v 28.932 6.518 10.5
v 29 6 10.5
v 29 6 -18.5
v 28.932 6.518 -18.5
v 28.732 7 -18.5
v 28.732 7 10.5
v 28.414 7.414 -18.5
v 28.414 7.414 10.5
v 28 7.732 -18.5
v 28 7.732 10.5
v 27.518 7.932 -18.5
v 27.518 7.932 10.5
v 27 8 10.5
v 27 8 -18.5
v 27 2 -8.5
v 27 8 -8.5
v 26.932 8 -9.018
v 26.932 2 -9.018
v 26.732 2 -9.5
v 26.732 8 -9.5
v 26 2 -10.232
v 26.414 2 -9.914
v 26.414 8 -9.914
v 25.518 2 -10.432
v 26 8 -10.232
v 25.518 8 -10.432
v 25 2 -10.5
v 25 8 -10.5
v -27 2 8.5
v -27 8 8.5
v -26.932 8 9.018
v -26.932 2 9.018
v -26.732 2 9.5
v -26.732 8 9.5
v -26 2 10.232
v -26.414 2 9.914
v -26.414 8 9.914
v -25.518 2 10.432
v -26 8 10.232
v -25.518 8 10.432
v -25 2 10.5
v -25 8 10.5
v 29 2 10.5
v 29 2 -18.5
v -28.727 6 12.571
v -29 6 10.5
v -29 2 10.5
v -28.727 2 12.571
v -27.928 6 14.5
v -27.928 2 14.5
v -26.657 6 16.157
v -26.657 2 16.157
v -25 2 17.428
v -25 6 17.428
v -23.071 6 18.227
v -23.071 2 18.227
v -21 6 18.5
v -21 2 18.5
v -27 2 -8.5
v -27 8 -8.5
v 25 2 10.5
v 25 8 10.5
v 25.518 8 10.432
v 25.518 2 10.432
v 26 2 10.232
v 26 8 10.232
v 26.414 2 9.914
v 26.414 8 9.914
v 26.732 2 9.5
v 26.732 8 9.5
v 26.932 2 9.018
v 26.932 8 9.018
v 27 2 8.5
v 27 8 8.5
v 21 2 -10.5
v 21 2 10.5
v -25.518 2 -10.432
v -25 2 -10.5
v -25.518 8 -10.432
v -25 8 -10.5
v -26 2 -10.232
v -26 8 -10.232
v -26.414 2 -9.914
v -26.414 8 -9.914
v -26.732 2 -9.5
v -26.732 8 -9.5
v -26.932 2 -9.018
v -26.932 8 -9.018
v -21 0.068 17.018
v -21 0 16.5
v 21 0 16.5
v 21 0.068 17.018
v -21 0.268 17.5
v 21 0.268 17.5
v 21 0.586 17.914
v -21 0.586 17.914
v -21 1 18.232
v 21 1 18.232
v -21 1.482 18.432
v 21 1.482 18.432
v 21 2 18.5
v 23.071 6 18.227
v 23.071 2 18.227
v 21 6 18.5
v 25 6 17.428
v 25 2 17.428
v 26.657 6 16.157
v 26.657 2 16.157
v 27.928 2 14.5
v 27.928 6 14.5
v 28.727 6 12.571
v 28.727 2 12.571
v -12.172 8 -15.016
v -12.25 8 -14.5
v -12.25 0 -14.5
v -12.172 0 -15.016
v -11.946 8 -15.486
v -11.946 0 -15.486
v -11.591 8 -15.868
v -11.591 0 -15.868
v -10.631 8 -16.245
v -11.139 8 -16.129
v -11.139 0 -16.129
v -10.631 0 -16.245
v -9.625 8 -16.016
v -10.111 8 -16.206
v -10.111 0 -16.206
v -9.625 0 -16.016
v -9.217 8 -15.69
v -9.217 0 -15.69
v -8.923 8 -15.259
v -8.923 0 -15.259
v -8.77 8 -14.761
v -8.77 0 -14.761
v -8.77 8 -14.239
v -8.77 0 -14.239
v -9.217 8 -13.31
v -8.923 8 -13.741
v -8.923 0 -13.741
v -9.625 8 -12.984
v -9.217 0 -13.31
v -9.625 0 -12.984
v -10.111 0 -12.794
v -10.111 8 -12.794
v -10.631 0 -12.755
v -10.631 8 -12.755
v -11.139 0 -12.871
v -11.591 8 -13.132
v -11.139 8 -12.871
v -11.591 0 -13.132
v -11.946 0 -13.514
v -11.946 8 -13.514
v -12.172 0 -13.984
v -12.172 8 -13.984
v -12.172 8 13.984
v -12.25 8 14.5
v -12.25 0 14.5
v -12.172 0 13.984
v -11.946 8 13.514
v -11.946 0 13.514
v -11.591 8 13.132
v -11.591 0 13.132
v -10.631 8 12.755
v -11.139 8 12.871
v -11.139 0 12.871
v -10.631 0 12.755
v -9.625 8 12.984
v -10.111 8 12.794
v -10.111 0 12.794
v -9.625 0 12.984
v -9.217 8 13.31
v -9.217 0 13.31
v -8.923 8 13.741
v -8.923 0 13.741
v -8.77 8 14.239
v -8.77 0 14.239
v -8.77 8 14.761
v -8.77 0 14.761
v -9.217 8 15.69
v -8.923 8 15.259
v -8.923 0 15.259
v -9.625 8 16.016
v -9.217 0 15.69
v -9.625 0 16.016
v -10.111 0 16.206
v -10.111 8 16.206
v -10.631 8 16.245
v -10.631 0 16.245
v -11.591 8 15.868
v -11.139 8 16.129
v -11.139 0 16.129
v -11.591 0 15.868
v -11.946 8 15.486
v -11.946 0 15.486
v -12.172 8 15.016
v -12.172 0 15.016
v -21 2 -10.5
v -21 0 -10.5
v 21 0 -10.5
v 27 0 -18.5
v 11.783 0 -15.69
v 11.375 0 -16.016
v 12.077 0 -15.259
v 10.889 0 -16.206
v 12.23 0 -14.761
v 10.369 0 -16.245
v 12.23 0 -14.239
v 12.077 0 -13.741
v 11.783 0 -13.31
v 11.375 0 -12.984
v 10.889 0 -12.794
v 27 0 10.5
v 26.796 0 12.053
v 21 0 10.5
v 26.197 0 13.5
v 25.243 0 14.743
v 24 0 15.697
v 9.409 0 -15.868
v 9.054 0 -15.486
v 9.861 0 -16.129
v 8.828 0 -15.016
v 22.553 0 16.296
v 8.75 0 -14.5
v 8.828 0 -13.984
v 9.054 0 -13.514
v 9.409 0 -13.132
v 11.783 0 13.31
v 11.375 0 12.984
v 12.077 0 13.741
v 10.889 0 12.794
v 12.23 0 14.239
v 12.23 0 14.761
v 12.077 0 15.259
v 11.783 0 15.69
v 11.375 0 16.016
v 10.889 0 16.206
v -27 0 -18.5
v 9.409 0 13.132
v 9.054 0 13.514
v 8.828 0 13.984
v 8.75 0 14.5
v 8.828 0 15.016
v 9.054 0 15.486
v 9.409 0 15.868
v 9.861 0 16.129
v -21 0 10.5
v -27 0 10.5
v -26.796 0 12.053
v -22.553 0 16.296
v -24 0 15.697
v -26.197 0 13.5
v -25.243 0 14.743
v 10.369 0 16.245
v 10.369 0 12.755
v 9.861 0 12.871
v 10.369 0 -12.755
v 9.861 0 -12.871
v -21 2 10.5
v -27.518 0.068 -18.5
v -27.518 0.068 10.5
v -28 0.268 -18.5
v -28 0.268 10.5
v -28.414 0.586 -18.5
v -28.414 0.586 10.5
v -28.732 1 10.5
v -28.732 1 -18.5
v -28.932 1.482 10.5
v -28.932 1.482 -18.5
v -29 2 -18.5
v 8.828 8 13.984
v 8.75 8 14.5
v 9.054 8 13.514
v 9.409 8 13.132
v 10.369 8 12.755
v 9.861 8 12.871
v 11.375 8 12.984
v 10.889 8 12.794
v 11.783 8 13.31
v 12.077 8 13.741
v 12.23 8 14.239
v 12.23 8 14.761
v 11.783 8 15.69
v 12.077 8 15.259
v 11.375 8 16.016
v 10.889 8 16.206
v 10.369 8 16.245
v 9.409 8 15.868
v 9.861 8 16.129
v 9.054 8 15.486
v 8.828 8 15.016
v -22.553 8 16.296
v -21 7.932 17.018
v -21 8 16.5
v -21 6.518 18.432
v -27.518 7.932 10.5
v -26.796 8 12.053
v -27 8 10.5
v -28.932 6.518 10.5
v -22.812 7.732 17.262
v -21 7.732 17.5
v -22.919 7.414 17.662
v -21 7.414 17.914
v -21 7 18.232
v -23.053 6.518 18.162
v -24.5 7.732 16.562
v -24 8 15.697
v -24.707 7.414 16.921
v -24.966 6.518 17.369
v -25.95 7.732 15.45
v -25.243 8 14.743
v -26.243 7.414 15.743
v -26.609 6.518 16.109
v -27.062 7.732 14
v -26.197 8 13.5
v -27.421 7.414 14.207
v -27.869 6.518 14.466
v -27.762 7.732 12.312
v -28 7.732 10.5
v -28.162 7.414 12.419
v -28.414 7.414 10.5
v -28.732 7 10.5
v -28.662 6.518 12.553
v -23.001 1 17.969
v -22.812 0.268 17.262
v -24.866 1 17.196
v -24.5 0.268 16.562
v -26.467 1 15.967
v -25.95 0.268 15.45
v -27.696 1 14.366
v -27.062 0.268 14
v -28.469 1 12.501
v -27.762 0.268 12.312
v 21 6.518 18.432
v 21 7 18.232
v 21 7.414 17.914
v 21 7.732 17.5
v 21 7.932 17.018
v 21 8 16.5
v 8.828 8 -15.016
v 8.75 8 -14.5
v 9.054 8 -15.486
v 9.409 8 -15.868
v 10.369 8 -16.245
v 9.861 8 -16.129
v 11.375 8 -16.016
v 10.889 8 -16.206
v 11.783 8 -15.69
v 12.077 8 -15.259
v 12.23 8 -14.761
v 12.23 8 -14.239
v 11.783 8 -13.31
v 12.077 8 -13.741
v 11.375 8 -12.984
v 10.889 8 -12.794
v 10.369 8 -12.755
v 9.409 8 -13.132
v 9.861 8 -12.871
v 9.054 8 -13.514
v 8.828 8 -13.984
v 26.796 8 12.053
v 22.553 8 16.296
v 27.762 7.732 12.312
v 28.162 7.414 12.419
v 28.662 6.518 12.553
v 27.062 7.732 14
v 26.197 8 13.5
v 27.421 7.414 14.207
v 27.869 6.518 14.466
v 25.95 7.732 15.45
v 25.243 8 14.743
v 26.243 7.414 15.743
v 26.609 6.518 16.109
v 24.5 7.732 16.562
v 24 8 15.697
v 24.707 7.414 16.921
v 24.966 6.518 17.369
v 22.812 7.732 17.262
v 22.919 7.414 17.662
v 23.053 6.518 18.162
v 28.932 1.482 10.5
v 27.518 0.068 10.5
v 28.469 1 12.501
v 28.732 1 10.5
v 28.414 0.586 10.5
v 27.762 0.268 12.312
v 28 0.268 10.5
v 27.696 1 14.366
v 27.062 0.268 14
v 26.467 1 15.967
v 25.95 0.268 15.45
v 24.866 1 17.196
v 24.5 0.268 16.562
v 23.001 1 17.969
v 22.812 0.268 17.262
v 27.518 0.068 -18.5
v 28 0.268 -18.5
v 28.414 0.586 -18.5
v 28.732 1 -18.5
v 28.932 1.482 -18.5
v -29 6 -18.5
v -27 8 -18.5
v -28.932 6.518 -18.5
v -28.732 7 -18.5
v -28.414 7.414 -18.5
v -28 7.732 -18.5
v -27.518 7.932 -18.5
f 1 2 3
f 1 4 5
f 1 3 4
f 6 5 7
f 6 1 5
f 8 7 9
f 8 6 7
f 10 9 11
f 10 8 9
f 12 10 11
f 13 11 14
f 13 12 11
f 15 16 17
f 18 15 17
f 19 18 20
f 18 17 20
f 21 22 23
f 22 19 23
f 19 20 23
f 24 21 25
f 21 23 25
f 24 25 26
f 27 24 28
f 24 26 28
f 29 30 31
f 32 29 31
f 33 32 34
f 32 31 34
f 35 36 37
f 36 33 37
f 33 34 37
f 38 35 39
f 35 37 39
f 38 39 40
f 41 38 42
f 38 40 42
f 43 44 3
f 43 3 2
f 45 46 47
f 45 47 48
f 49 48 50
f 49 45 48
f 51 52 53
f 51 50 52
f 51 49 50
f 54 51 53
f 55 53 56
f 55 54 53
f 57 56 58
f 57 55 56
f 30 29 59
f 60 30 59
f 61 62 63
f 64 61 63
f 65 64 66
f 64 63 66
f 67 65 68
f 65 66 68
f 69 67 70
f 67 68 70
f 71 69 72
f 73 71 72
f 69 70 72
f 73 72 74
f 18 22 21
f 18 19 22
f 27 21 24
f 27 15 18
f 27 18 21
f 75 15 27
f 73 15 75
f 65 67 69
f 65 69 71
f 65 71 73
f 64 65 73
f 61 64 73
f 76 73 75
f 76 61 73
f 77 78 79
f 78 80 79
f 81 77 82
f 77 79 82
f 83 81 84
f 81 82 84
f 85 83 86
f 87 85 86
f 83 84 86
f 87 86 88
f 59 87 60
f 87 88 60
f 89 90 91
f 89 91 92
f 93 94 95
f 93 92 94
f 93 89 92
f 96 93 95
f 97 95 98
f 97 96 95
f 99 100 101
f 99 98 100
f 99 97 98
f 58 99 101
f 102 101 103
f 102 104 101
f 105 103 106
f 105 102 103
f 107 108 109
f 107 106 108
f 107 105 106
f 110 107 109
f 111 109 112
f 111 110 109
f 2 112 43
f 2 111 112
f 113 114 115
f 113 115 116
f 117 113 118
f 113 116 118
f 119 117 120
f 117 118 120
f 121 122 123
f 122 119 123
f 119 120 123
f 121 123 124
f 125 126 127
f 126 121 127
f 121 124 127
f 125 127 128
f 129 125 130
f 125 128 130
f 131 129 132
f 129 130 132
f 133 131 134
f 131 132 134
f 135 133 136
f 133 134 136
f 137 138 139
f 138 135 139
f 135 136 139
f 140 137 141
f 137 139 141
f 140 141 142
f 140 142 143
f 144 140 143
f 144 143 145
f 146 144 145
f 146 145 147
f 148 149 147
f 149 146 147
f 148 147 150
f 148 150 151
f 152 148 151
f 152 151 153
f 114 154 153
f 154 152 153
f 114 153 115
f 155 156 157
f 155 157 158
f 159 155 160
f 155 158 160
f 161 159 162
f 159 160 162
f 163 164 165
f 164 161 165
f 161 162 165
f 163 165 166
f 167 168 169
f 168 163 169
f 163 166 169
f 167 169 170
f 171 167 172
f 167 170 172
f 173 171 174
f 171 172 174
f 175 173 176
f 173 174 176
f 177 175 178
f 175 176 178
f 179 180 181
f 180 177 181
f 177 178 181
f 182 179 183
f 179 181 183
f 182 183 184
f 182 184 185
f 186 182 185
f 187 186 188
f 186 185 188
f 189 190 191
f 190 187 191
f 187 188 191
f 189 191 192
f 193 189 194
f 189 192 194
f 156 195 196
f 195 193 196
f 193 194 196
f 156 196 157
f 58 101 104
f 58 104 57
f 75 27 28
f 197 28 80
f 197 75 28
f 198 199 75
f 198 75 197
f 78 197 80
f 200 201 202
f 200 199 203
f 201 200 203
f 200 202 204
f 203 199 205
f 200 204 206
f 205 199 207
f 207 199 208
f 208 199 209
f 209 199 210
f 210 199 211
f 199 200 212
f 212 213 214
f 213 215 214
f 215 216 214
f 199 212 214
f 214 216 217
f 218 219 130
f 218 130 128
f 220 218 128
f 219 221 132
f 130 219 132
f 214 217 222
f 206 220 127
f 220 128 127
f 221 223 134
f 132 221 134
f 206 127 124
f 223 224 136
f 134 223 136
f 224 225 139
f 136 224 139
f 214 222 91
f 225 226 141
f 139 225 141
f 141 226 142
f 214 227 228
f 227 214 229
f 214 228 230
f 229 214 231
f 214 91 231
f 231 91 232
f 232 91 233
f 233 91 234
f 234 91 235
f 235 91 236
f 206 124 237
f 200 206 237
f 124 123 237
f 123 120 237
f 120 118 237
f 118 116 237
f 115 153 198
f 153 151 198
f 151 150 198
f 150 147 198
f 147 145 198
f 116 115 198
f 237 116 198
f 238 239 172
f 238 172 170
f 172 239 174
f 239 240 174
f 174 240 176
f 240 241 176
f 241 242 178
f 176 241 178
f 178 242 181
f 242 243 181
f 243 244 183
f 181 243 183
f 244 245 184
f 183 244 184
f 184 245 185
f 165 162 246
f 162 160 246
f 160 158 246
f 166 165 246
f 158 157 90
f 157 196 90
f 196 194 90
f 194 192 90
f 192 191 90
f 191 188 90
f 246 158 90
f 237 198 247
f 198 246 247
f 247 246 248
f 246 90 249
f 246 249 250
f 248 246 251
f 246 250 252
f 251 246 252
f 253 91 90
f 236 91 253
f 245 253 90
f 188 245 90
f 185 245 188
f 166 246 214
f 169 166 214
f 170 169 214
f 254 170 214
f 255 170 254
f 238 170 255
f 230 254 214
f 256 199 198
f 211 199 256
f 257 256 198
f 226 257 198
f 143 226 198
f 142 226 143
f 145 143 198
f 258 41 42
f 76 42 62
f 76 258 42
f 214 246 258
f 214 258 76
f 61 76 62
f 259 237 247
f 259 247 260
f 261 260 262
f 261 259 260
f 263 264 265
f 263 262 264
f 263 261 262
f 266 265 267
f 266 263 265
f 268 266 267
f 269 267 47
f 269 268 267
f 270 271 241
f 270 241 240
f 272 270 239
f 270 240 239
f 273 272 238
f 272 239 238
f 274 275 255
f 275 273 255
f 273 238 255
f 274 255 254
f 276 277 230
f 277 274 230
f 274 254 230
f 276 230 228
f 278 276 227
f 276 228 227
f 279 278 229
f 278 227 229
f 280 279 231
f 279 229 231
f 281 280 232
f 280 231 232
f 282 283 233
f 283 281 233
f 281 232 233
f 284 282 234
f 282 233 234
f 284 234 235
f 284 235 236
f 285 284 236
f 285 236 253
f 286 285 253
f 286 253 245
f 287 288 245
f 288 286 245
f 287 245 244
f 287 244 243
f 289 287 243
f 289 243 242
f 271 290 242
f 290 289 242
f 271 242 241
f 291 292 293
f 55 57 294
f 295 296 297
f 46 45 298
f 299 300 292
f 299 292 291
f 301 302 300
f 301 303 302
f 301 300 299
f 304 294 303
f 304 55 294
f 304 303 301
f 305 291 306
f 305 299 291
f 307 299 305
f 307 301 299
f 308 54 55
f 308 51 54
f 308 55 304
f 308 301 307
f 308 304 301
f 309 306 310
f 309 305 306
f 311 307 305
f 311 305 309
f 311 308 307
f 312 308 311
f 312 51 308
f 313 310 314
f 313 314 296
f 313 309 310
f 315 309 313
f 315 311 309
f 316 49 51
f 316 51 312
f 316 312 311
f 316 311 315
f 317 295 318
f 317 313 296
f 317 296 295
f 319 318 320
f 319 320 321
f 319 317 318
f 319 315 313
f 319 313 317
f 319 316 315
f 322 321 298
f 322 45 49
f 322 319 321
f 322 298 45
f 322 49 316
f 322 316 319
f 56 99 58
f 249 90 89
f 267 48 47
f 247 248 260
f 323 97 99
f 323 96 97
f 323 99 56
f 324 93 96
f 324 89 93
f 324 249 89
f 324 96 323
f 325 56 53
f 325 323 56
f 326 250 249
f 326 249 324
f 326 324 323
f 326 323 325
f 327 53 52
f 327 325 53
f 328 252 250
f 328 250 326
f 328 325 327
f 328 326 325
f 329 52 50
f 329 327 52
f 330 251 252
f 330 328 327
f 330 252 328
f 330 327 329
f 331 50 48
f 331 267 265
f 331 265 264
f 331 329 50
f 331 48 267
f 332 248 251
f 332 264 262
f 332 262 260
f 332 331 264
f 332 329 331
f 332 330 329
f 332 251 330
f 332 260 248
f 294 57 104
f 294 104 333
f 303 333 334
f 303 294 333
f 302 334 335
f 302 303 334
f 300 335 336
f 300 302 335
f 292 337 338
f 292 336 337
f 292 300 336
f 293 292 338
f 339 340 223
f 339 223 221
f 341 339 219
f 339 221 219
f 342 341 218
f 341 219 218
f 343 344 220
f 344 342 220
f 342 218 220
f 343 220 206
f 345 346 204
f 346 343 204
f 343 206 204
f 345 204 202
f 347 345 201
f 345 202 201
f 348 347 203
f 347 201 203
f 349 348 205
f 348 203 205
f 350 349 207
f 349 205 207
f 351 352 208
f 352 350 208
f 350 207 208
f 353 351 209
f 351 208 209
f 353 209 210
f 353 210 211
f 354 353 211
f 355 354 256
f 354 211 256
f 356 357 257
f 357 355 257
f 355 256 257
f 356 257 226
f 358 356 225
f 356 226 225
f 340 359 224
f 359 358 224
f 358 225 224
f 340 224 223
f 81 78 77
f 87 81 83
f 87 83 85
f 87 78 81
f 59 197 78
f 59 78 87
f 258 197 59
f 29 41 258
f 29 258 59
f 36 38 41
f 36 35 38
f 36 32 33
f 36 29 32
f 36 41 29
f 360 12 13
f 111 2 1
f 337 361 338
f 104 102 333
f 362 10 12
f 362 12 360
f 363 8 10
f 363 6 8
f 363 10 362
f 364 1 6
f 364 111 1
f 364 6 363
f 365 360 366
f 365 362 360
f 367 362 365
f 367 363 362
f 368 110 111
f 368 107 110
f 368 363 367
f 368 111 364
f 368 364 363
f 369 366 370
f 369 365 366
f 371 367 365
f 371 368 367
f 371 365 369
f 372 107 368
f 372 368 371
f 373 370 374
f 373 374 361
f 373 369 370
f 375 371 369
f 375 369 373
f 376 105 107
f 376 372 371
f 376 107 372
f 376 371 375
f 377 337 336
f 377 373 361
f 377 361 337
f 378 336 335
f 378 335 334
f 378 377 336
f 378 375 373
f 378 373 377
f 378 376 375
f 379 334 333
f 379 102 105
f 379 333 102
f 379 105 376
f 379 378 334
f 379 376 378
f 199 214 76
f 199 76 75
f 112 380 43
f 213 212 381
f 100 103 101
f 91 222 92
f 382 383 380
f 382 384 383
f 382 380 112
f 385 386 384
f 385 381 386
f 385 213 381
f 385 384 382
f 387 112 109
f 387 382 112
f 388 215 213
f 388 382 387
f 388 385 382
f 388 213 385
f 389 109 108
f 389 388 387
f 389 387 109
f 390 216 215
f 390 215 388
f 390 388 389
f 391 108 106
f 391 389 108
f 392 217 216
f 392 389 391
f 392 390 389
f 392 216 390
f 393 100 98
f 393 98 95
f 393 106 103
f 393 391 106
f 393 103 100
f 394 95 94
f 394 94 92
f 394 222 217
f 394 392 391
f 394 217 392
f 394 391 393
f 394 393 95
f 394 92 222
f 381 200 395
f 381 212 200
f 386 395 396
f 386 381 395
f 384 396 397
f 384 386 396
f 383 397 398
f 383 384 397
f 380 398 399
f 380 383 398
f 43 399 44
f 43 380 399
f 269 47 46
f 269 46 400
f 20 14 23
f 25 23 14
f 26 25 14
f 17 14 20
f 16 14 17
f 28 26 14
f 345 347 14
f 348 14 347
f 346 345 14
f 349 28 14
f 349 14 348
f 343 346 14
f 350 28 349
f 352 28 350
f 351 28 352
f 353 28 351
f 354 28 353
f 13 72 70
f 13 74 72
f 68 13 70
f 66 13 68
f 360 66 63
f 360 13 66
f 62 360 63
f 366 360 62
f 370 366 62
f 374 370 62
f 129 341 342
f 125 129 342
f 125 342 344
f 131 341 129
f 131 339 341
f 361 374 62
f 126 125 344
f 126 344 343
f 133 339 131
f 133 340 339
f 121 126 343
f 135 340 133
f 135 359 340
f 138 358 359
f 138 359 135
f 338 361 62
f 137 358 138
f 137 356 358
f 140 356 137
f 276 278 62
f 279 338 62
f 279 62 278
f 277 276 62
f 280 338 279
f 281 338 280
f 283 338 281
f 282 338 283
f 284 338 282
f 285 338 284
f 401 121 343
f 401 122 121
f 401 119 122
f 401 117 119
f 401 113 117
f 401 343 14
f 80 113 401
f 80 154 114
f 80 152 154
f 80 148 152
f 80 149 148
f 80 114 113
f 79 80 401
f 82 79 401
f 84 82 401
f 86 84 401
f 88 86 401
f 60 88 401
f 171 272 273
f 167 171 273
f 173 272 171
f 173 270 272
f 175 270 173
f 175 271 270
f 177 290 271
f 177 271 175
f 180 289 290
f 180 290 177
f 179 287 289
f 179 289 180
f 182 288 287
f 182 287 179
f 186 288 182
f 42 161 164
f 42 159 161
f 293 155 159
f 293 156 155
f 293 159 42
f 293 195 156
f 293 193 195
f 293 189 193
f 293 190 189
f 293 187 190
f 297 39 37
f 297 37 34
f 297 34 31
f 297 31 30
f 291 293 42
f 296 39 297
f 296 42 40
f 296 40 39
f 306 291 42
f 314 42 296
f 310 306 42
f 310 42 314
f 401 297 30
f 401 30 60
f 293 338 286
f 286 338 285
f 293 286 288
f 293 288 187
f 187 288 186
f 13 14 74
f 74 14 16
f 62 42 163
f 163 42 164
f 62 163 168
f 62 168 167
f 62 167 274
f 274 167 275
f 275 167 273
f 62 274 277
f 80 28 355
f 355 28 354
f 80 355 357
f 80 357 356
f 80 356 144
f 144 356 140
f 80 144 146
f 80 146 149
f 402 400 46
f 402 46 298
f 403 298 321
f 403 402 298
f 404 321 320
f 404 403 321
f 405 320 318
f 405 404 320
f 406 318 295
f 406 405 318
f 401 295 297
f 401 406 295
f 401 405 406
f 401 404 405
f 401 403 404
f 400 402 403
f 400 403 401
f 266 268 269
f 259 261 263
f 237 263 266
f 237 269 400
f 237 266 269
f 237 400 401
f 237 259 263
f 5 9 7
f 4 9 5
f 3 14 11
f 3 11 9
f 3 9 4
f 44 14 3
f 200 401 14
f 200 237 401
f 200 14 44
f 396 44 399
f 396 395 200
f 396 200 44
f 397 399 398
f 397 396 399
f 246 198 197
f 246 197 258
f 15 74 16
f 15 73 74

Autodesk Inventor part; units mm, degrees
ref_plane "YZ Plane" through (0, 0, 0) normal (1, 0, 0) x (0, 1, 0)
ref_plane "XZ Plane" through (0, 0, 0) normal (0, 1, 0) x (-1, 0, 0)
ref_plane "XY Plane" through (0, 0, 0) normal (0, 0, 1) x (1, 0, 0)
sketch "Sketch1" plane through (0, 0, 0) normal (0, 1, 0) x (-1, 0, 0)
  line L0 (21, 10.5) -> (-21, 10.5)
  line L1 (-21, 10.5) -> (-21, -10.5)
  line L2 (-21, -10.5) -> (21, -10.5)
  line L3 (21, -10.5) -> (21, 10.5)
  line L4 (21, 10.5) -> (-21, -10.5) construction
  line L5 (-21, 10.5) -> (21, -10.5) construction
  line L6 (-29, 18.5) -> (29, 18.5)
  line L7 (29, 18.5) -> (29, -18.5)
  line L8 (29, -18.5) -> (-29, -18.5)
  line L9 (-29, -18.5) -> (-29, 18.5)
  circle A0 centre (10.5, 14.5) radius 1.75
  line L10 (0, 10.5) -> (0, -10.5) construction
  line L11 (-21, 0) -> (21, 0) construction
  circle A1 centre (10.5, -14.5) radius 1.75
  circle A2 centre (-10.5, 14.5) radius 1.75
  circle A3 centre (-10.5, -14.5) radius 1.75
  line L12 (-21, 10.5) -> (-27, 10.5)
  line L13 (-27, 10.5) -> (-27, -10.5)
  line L14 (-27, -10.5) -> (-21, -10.5)
  line L15 (-21, -10.5) -> (-21, 10.5)
  line L16 (21, 10.5) -> (27, 10.5)
  line L17 (27, 10.5) -> (27, -10.5)
  line L18 (27, -10.5) -> (21, -10.5)
  point P0 (0, 0)
  dimension "d0" = 21
  dimension "d1" = 42
  dimension "d2" = 8
  dimension "d3" = 3.5
  dimension "d4" = 10.5
  dimension "d5" = 4
  dimension "d6" = 6
  dimension "d7" = 21
extrude "Extrusion1" add sketch "Sketch1" along normal blind 8
extrude "Extrusion2" add sketch "Sketch1" along normal blind 2 contours L16 L17 L18 L3 | L1 L14 L13 L12
fillet "Fillet1" radius 8 2 edges at (-29, 4, 18.5) (29, 4, 18.5)
fillet "Fillet2" radius 2 4 edges at (-27, 5, 10.5) (-27, 5, -10.5) (27, 5, 10.5) (27, 5, -10.5)
fillet "Fillet3" radius 2 10 edges at (-26.6569, 0, 16.1569) (0, 0, 18.5) (26.6569, 0, 16.1569) (29, 0, -4) (-29, 0, -4) (-26.6569, 8, 16.1569) (0, 8, 18.5) (26.6569, 8, 16.1569) (29, 8, -4) (-29, 8, -4)
equation "\"d0\" = MountWidth"
equation "\"d1\" = MountLength"
equation "\"d2\" = MountThickness"
equation "\"d3\" = THROUGH_DIAMETER"
equation "\"d4\" = 0.25 * MountLength"
equation "\"d5\" = 0.5 * MountThickness"
equation "\"d7\" = MountWidth"
equation "\"d8\" = OUTER_HEIGHT"
equation "\"d12\" = OUTER_FILLET"
equation "\"d13\" = INNER_FILLET"
equation "\"d14\" = PART_FILLET"
equation "\"MountWidth\" = 21"
equation "\"MountLength\" = 42"
equation "\"MountThickness\" = 8"
equation "\"THROUGH_DIAMETER\" = 3.5"
equation "\"OUTER_HEIGHT\" = 8"
equation "\"OUTER_FILLET\" = 8"
equation "\"INNER_FILLET\" = 2"
equation "\"PART_FILLET\" = 2"
properties part number "CoxaServoCutout"
